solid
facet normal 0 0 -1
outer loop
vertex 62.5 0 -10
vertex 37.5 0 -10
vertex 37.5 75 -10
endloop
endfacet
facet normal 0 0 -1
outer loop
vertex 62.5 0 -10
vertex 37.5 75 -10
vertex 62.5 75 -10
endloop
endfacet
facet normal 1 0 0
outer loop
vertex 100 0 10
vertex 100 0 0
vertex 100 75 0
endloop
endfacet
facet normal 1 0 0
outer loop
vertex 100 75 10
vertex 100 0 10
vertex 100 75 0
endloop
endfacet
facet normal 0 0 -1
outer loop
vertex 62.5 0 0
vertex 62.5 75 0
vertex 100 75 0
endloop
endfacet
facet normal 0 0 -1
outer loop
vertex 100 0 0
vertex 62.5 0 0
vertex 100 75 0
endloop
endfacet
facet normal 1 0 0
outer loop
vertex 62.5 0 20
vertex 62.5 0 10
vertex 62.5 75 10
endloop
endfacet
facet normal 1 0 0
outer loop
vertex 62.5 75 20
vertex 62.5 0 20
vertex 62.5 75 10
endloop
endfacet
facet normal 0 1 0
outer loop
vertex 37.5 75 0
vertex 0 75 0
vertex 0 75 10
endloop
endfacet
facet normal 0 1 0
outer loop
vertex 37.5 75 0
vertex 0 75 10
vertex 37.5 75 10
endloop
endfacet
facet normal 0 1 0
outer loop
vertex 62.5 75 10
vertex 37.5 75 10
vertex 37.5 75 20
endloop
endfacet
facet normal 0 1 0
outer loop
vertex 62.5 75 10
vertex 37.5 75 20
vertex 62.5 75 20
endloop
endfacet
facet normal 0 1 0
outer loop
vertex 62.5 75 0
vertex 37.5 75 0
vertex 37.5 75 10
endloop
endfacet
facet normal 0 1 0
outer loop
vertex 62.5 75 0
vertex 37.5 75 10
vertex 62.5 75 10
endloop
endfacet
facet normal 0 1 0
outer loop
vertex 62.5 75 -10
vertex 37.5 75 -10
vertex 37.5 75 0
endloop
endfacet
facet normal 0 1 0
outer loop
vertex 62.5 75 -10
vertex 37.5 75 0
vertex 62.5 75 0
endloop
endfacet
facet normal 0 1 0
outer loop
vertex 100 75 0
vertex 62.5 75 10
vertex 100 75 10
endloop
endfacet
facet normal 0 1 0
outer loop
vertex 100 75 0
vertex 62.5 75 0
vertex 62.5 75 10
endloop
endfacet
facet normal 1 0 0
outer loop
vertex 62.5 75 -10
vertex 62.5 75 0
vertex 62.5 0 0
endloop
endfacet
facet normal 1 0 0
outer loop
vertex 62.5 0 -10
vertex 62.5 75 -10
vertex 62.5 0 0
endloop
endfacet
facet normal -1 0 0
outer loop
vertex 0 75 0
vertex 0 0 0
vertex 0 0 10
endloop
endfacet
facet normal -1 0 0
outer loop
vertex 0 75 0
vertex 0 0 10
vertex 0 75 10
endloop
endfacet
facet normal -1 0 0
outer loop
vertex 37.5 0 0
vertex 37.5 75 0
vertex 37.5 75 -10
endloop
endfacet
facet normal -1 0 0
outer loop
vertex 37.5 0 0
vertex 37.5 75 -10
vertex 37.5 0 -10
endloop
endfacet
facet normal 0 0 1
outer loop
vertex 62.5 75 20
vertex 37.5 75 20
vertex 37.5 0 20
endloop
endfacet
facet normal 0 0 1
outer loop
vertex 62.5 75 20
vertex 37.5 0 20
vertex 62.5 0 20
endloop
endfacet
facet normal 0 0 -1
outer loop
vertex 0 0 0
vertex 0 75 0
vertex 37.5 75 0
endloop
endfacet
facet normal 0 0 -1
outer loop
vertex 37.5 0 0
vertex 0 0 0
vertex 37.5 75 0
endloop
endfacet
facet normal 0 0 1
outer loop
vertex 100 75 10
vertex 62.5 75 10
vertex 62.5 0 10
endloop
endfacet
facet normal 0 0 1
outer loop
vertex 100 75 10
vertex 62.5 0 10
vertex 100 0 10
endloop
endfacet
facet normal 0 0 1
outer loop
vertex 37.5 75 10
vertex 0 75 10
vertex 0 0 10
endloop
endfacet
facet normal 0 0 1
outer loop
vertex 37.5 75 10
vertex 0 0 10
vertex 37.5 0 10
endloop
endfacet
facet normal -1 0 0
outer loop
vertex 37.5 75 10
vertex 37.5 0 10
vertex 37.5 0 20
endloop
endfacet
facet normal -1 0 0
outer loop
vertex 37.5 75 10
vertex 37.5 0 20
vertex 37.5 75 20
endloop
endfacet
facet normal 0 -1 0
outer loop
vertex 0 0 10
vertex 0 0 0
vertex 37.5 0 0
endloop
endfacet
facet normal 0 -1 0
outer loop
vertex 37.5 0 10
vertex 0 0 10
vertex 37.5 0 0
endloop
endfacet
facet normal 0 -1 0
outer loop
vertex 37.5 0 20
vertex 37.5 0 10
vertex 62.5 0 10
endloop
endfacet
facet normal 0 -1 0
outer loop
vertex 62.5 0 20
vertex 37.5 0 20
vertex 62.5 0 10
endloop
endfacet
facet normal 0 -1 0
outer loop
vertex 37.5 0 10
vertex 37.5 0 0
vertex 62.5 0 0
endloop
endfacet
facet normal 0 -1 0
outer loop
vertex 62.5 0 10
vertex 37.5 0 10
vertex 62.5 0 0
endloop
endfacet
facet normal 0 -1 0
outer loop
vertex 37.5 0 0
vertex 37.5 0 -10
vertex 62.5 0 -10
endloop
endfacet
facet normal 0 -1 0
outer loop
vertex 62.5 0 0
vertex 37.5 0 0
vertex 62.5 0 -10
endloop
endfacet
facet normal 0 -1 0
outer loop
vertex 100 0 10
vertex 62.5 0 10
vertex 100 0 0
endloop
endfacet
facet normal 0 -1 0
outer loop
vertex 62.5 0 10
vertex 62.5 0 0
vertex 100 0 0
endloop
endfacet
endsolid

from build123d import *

# Parameters (mm, degrees)
SKETCH_W     = 100
SKETCH_H     = 75
PAD_DEPTH    = 10
SKETCH001_W  = 25
SKETCH001_H  = 75
PAD001_DEPTH = 10
SKETCH002_W  = 25
SKETCH002_H  = 75
PAD002_DEPTH = 10


with BuildPart() as part:
    # Sketch → Pad (new body)
    with BuildSketch(Plane.XY):
        with Locations((50, 37.5)):
            Rectangle(SKETCH_W, SKETCH_H)
    extrude(amount=PAD_DEPTH)

    # Sketch001 → Pad001 (new body)
    with BuildSketch(Plane.XY.offset(10)):
        with Locations((50, 37.5)):
            Rectangle(SKETCH001_W, SKETCH001_H)
    extrude(amount=PAD001_DEPTH)

    # Sketch002 → Pad002 (new body)
    with BuildSketch(Plane(origin=(0, 0, 0), x_dir=(1, 0, 0), z_dir=(0, 0, -1))):
        with Locations((50, -37.5)):
            Rectangle(SKETCH002_W, SKETCH002_H)
    extrude(amount=PAD002_DEPTH)


solid = part.part
